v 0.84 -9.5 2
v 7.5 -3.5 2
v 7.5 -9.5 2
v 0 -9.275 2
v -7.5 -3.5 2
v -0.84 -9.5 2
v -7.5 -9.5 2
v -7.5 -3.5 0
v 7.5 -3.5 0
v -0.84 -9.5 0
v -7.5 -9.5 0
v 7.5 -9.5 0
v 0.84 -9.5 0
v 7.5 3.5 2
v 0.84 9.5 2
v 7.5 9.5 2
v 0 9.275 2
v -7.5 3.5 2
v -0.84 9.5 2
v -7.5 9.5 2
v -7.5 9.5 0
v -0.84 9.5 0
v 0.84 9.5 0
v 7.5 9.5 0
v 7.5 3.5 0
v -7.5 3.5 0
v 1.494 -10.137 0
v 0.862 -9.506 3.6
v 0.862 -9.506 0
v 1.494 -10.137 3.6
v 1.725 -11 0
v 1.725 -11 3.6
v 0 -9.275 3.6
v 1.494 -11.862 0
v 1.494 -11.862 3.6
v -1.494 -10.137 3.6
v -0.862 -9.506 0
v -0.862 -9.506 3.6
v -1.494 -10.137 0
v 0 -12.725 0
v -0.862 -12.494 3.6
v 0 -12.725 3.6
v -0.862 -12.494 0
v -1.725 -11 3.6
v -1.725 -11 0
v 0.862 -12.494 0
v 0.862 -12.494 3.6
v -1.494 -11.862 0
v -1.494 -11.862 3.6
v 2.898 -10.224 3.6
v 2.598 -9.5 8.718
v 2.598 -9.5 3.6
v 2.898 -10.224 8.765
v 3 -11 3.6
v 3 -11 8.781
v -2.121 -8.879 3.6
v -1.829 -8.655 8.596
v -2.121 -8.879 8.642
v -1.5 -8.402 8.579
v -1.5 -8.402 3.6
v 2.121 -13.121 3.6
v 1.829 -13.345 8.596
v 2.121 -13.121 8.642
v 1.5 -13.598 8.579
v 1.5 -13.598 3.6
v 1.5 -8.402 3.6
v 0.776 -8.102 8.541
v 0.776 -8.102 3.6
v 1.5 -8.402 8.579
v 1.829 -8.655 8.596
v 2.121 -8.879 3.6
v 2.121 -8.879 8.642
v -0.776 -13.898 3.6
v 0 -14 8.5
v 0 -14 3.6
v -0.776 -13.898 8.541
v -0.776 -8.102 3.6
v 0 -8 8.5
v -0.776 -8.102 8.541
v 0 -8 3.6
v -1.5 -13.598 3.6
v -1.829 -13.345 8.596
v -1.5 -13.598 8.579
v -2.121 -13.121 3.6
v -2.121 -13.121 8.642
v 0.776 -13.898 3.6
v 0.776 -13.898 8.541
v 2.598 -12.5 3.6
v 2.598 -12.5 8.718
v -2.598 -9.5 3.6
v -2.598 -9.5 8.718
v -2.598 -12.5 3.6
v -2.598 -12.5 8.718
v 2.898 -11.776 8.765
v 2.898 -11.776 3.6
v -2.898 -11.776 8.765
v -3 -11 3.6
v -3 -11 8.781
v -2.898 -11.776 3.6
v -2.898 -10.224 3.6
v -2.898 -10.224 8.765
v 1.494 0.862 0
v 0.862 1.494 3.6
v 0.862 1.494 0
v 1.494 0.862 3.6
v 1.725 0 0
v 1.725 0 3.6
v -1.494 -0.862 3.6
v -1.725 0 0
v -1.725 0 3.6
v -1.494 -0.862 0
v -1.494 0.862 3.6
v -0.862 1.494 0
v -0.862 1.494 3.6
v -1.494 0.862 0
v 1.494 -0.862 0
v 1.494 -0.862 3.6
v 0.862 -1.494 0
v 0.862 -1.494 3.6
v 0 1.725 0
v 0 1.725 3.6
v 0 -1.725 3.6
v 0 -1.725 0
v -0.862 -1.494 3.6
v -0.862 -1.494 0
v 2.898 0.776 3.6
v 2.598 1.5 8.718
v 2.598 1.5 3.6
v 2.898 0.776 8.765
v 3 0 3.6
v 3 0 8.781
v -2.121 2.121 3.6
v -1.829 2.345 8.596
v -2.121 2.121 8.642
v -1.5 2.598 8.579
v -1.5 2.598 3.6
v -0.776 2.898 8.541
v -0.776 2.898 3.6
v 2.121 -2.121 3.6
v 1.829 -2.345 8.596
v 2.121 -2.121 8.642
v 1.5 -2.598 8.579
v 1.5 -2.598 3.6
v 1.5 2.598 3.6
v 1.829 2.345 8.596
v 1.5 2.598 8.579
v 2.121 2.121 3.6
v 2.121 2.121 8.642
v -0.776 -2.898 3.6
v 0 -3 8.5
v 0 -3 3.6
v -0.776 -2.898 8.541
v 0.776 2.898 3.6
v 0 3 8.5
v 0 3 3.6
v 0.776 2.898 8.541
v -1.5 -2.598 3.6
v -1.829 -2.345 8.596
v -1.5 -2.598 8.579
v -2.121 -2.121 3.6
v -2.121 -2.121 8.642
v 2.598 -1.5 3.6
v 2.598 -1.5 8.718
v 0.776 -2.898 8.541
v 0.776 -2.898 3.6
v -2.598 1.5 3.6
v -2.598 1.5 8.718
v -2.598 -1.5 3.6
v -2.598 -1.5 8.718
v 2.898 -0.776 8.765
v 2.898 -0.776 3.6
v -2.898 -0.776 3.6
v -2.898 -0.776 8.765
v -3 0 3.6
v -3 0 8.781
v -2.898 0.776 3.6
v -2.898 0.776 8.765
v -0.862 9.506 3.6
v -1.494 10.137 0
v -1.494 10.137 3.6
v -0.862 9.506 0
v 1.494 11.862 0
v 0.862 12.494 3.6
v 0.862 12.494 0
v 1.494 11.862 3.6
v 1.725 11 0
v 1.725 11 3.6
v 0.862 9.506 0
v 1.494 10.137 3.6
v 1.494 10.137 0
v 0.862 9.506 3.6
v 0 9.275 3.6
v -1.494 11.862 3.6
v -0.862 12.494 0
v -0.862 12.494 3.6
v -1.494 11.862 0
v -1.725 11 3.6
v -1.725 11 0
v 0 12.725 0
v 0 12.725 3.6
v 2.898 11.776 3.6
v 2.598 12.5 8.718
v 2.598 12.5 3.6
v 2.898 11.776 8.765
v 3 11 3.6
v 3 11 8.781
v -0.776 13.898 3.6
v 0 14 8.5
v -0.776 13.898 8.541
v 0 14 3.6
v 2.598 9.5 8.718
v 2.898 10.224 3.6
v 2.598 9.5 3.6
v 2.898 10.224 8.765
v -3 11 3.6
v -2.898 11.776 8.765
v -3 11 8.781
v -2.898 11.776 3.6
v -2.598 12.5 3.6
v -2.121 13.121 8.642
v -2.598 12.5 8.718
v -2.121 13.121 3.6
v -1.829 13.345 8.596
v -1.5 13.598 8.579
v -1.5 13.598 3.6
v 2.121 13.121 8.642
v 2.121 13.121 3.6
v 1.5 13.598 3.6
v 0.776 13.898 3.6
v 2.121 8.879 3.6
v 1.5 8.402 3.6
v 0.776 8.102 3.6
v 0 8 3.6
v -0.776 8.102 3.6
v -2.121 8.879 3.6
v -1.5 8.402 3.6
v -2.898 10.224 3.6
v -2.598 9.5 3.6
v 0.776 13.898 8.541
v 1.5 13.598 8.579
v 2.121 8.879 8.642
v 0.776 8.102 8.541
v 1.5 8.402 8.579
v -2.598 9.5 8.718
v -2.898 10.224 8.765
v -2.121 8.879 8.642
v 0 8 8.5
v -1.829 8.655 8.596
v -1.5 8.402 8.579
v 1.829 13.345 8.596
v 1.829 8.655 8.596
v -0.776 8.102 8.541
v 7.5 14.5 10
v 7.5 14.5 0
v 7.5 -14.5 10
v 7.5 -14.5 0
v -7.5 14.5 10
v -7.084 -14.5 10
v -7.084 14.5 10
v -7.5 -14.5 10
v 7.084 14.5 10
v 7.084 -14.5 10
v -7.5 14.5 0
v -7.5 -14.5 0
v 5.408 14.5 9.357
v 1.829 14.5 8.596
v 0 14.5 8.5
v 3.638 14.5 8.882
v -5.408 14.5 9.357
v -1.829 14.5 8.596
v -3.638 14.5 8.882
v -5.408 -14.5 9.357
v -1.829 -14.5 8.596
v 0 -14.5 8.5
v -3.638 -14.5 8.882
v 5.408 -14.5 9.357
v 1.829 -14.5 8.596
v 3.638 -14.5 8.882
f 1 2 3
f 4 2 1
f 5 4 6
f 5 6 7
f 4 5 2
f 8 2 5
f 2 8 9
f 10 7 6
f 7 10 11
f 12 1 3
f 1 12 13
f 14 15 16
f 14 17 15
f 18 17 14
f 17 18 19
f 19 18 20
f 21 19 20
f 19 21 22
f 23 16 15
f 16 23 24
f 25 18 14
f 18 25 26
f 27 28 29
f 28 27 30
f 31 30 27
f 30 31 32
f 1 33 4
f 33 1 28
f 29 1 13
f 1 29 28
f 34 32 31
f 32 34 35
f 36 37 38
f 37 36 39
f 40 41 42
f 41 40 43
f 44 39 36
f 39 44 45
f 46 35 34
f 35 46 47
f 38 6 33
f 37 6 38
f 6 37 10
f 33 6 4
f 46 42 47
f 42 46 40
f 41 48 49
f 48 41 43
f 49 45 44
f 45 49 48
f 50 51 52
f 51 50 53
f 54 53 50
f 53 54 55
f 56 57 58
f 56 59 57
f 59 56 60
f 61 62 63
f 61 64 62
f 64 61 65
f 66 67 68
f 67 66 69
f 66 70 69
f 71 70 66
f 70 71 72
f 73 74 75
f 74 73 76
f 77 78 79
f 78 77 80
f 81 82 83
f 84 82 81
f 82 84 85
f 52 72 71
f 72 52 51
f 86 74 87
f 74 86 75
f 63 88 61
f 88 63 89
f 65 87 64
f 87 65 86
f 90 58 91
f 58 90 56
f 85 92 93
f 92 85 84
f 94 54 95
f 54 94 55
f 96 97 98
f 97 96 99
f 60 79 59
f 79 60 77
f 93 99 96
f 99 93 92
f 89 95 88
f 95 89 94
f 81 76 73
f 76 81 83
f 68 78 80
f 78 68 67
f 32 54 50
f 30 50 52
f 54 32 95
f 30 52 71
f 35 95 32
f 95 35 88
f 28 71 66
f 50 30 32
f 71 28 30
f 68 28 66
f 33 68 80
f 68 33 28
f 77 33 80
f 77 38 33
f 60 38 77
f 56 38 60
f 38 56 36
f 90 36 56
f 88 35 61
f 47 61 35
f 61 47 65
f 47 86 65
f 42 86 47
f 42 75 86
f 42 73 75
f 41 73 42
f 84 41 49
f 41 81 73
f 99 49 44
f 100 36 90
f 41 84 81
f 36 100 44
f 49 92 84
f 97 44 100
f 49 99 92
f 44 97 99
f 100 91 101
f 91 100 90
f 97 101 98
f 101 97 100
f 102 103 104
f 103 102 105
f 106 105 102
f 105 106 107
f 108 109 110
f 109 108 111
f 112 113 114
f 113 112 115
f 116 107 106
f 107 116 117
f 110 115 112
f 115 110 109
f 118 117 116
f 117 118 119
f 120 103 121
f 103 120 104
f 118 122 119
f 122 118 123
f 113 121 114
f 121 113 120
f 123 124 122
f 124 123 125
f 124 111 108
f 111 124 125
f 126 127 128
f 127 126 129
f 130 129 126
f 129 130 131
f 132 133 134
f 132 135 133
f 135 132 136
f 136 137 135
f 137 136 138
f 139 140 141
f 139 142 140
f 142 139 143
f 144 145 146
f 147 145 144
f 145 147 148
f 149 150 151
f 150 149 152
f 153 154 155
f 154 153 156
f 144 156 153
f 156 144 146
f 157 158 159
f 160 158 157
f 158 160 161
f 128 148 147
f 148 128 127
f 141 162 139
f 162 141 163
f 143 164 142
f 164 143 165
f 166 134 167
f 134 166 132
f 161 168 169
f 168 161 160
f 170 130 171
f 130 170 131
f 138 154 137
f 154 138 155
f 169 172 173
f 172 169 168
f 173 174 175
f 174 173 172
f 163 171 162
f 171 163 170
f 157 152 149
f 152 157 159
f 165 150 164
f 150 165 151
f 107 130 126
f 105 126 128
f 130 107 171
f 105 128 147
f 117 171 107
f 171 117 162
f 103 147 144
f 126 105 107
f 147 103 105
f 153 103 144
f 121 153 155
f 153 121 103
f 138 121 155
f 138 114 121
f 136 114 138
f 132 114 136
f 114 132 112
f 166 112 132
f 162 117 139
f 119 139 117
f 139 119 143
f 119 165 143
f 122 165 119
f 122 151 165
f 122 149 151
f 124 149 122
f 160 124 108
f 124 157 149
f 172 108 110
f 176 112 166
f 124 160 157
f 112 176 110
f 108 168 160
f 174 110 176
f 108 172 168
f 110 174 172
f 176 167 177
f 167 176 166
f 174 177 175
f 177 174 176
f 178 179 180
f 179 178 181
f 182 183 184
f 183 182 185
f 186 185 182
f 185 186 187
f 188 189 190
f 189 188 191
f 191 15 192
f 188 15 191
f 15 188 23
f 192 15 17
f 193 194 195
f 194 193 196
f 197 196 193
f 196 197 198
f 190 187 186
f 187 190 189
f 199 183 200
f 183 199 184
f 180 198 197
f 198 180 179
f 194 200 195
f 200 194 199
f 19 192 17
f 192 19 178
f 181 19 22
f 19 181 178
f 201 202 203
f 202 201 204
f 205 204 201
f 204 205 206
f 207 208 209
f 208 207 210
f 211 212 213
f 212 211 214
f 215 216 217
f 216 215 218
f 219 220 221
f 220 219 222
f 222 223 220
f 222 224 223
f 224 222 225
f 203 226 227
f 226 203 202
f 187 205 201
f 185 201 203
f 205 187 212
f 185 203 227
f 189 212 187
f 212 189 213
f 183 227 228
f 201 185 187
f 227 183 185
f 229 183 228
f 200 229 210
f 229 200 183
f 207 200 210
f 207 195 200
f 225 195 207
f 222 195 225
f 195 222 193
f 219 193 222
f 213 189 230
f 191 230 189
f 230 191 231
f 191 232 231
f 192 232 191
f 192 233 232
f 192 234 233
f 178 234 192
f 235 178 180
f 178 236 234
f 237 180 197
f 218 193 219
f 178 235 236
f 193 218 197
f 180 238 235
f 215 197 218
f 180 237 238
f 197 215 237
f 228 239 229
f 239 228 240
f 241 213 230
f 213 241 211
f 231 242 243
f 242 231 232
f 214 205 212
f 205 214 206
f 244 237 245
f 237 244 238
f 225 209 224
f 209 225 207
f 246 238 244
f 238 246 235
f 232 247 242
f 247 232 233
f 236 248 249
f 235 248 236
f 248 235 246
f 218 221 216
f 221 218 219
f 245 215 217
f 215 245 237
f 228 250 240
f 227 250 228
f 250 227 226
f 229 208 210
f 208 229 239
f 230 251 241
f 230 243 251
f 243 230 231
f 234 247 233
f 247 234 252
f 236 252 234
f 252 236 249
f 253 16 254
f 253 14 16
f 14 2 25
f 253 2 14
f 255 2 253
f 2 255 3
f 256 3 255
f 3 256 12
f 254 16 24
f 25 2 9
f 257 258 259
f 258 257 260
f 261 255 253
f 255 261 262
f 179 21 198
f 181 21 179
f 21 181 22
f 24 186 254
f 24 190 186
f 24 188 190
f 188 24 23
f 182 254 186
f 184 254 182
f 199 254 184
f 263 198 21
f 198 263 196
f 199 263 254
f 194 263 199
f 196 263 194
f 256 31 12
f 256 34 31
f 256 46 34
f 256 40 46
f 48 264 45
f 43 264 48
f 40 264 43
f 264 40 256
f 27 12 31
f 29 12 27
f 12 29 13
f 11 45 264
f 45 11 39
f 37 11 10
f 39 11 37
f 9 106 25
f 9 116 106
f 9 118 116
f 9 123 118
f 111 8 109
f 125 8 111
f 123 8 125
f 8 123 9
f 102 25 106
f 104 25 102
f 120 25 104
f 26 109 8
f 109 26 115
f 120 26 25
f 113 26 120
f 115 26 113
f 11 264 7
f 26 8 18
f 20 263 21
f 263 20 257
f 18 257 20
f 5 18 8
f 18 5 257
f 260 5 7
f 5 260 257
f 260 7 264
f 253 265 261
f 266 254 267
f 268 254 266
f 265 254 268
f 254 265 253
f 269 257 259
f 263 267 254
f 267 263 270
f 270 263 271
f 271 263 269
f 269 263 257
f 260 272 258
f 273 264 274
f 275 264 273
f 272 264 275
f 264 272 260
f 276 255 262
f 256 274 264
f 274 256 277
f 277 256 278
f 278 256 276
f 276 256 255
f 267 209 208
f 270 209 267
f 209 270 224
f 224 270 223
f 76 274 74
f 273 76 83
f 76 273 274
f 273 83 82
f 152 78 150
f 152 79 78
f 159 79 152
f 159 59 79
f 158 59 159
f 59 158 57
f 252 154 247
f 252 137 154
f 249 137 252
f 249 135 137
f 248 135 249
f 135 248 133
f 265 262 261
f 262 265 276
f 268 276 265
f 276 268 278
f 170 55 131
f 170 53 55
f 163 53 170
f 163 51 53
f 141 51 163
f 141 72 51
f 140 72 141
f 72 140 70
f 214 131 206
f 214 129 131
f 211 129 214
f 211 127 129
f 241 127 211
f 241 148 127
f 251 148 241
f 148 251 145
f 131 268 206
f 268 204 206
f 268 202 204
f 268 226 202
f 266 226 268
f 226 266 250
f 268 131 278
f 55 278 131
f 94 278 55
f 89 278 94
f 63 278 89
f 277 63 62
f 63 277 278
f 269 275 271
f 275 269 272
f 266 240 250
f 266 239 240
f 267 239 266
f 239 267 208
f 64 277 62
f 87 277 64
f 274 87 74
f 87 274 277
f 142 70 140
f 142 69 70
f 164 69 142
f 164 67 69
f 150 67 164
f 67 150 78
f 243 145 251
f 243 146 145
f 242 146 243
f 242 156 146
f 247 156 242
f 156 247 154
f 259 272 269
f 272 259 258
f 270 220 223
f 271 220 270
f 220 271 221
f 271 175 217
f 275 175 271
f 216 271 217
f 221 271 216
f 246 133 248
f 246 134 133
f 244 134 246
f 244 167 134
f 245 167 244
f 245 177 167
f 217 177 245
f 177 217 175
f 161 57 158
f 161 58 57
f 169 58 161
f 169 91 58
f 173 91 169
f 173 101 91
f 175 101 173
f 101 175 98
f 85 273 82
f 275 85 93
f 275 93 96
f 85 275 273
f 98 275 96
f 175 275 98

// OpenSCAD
// file: configuration.scad
// Increase this if your slicer or printer make holes too tight.
extra_radius = 0.1;

// OD = outside diameter, corner to corner.
m3_nut_od = 6.1;
m3_nut_radius = m3_nut_od/2 + 0.2 + extra_radius;
m3_washer_radius = 3.5 + extra_radius;

// Major diameter of metric 3mm thread.
m3_major = 2.85;
m3_radius = m3_major/2 + extra_radius;
m3_wide_radius = m3_major/2 + extra_radius + 0.2;

// NEMA17 stepper motors.
motor_shaft_diameter = 5;
motor_shaft_radius = motor_shaft_diameter/2 + extra_radius;

// Frame brackets. M3x8mm screws work best with 3.6 mm brackets.
thickness = 3.6;

// OpenBeam or Misumi. Currently only 15x15 mm, but there is a plan
// to make models more parametric and allow 20x20 mm in the future.
extrusion = 15;

// Placement for the NEMA17 stepper motors.
motor_offset = 44;
motor_length = 47;
// main file
include <configuration.scad>;

module frame_extruder() {
  difference() {
    union() {
      translate([0, 0, 5]) cube([15, 29, 10], center=true);
    }
    translate([0, 0, 26]) rotate([90, 0, 0])
      cylinder(r=17.5, h=30, center=true, $fn=60);
    for (y = [-6.5, 6.5]) {
      translate([0, y, 0])
        cube([20, 6, 4], center=true);
    }
    for (y = [-11, 0, 11]) {
      translate([0, y, 0])
        cylinder(r=m3_wide_radius, h=20, center=true, $fn=12);
      translate([0, y, thickness])
        # cylinder(r=3, h=10, $fn=24);
    }
  }
}

frame_extruder();
